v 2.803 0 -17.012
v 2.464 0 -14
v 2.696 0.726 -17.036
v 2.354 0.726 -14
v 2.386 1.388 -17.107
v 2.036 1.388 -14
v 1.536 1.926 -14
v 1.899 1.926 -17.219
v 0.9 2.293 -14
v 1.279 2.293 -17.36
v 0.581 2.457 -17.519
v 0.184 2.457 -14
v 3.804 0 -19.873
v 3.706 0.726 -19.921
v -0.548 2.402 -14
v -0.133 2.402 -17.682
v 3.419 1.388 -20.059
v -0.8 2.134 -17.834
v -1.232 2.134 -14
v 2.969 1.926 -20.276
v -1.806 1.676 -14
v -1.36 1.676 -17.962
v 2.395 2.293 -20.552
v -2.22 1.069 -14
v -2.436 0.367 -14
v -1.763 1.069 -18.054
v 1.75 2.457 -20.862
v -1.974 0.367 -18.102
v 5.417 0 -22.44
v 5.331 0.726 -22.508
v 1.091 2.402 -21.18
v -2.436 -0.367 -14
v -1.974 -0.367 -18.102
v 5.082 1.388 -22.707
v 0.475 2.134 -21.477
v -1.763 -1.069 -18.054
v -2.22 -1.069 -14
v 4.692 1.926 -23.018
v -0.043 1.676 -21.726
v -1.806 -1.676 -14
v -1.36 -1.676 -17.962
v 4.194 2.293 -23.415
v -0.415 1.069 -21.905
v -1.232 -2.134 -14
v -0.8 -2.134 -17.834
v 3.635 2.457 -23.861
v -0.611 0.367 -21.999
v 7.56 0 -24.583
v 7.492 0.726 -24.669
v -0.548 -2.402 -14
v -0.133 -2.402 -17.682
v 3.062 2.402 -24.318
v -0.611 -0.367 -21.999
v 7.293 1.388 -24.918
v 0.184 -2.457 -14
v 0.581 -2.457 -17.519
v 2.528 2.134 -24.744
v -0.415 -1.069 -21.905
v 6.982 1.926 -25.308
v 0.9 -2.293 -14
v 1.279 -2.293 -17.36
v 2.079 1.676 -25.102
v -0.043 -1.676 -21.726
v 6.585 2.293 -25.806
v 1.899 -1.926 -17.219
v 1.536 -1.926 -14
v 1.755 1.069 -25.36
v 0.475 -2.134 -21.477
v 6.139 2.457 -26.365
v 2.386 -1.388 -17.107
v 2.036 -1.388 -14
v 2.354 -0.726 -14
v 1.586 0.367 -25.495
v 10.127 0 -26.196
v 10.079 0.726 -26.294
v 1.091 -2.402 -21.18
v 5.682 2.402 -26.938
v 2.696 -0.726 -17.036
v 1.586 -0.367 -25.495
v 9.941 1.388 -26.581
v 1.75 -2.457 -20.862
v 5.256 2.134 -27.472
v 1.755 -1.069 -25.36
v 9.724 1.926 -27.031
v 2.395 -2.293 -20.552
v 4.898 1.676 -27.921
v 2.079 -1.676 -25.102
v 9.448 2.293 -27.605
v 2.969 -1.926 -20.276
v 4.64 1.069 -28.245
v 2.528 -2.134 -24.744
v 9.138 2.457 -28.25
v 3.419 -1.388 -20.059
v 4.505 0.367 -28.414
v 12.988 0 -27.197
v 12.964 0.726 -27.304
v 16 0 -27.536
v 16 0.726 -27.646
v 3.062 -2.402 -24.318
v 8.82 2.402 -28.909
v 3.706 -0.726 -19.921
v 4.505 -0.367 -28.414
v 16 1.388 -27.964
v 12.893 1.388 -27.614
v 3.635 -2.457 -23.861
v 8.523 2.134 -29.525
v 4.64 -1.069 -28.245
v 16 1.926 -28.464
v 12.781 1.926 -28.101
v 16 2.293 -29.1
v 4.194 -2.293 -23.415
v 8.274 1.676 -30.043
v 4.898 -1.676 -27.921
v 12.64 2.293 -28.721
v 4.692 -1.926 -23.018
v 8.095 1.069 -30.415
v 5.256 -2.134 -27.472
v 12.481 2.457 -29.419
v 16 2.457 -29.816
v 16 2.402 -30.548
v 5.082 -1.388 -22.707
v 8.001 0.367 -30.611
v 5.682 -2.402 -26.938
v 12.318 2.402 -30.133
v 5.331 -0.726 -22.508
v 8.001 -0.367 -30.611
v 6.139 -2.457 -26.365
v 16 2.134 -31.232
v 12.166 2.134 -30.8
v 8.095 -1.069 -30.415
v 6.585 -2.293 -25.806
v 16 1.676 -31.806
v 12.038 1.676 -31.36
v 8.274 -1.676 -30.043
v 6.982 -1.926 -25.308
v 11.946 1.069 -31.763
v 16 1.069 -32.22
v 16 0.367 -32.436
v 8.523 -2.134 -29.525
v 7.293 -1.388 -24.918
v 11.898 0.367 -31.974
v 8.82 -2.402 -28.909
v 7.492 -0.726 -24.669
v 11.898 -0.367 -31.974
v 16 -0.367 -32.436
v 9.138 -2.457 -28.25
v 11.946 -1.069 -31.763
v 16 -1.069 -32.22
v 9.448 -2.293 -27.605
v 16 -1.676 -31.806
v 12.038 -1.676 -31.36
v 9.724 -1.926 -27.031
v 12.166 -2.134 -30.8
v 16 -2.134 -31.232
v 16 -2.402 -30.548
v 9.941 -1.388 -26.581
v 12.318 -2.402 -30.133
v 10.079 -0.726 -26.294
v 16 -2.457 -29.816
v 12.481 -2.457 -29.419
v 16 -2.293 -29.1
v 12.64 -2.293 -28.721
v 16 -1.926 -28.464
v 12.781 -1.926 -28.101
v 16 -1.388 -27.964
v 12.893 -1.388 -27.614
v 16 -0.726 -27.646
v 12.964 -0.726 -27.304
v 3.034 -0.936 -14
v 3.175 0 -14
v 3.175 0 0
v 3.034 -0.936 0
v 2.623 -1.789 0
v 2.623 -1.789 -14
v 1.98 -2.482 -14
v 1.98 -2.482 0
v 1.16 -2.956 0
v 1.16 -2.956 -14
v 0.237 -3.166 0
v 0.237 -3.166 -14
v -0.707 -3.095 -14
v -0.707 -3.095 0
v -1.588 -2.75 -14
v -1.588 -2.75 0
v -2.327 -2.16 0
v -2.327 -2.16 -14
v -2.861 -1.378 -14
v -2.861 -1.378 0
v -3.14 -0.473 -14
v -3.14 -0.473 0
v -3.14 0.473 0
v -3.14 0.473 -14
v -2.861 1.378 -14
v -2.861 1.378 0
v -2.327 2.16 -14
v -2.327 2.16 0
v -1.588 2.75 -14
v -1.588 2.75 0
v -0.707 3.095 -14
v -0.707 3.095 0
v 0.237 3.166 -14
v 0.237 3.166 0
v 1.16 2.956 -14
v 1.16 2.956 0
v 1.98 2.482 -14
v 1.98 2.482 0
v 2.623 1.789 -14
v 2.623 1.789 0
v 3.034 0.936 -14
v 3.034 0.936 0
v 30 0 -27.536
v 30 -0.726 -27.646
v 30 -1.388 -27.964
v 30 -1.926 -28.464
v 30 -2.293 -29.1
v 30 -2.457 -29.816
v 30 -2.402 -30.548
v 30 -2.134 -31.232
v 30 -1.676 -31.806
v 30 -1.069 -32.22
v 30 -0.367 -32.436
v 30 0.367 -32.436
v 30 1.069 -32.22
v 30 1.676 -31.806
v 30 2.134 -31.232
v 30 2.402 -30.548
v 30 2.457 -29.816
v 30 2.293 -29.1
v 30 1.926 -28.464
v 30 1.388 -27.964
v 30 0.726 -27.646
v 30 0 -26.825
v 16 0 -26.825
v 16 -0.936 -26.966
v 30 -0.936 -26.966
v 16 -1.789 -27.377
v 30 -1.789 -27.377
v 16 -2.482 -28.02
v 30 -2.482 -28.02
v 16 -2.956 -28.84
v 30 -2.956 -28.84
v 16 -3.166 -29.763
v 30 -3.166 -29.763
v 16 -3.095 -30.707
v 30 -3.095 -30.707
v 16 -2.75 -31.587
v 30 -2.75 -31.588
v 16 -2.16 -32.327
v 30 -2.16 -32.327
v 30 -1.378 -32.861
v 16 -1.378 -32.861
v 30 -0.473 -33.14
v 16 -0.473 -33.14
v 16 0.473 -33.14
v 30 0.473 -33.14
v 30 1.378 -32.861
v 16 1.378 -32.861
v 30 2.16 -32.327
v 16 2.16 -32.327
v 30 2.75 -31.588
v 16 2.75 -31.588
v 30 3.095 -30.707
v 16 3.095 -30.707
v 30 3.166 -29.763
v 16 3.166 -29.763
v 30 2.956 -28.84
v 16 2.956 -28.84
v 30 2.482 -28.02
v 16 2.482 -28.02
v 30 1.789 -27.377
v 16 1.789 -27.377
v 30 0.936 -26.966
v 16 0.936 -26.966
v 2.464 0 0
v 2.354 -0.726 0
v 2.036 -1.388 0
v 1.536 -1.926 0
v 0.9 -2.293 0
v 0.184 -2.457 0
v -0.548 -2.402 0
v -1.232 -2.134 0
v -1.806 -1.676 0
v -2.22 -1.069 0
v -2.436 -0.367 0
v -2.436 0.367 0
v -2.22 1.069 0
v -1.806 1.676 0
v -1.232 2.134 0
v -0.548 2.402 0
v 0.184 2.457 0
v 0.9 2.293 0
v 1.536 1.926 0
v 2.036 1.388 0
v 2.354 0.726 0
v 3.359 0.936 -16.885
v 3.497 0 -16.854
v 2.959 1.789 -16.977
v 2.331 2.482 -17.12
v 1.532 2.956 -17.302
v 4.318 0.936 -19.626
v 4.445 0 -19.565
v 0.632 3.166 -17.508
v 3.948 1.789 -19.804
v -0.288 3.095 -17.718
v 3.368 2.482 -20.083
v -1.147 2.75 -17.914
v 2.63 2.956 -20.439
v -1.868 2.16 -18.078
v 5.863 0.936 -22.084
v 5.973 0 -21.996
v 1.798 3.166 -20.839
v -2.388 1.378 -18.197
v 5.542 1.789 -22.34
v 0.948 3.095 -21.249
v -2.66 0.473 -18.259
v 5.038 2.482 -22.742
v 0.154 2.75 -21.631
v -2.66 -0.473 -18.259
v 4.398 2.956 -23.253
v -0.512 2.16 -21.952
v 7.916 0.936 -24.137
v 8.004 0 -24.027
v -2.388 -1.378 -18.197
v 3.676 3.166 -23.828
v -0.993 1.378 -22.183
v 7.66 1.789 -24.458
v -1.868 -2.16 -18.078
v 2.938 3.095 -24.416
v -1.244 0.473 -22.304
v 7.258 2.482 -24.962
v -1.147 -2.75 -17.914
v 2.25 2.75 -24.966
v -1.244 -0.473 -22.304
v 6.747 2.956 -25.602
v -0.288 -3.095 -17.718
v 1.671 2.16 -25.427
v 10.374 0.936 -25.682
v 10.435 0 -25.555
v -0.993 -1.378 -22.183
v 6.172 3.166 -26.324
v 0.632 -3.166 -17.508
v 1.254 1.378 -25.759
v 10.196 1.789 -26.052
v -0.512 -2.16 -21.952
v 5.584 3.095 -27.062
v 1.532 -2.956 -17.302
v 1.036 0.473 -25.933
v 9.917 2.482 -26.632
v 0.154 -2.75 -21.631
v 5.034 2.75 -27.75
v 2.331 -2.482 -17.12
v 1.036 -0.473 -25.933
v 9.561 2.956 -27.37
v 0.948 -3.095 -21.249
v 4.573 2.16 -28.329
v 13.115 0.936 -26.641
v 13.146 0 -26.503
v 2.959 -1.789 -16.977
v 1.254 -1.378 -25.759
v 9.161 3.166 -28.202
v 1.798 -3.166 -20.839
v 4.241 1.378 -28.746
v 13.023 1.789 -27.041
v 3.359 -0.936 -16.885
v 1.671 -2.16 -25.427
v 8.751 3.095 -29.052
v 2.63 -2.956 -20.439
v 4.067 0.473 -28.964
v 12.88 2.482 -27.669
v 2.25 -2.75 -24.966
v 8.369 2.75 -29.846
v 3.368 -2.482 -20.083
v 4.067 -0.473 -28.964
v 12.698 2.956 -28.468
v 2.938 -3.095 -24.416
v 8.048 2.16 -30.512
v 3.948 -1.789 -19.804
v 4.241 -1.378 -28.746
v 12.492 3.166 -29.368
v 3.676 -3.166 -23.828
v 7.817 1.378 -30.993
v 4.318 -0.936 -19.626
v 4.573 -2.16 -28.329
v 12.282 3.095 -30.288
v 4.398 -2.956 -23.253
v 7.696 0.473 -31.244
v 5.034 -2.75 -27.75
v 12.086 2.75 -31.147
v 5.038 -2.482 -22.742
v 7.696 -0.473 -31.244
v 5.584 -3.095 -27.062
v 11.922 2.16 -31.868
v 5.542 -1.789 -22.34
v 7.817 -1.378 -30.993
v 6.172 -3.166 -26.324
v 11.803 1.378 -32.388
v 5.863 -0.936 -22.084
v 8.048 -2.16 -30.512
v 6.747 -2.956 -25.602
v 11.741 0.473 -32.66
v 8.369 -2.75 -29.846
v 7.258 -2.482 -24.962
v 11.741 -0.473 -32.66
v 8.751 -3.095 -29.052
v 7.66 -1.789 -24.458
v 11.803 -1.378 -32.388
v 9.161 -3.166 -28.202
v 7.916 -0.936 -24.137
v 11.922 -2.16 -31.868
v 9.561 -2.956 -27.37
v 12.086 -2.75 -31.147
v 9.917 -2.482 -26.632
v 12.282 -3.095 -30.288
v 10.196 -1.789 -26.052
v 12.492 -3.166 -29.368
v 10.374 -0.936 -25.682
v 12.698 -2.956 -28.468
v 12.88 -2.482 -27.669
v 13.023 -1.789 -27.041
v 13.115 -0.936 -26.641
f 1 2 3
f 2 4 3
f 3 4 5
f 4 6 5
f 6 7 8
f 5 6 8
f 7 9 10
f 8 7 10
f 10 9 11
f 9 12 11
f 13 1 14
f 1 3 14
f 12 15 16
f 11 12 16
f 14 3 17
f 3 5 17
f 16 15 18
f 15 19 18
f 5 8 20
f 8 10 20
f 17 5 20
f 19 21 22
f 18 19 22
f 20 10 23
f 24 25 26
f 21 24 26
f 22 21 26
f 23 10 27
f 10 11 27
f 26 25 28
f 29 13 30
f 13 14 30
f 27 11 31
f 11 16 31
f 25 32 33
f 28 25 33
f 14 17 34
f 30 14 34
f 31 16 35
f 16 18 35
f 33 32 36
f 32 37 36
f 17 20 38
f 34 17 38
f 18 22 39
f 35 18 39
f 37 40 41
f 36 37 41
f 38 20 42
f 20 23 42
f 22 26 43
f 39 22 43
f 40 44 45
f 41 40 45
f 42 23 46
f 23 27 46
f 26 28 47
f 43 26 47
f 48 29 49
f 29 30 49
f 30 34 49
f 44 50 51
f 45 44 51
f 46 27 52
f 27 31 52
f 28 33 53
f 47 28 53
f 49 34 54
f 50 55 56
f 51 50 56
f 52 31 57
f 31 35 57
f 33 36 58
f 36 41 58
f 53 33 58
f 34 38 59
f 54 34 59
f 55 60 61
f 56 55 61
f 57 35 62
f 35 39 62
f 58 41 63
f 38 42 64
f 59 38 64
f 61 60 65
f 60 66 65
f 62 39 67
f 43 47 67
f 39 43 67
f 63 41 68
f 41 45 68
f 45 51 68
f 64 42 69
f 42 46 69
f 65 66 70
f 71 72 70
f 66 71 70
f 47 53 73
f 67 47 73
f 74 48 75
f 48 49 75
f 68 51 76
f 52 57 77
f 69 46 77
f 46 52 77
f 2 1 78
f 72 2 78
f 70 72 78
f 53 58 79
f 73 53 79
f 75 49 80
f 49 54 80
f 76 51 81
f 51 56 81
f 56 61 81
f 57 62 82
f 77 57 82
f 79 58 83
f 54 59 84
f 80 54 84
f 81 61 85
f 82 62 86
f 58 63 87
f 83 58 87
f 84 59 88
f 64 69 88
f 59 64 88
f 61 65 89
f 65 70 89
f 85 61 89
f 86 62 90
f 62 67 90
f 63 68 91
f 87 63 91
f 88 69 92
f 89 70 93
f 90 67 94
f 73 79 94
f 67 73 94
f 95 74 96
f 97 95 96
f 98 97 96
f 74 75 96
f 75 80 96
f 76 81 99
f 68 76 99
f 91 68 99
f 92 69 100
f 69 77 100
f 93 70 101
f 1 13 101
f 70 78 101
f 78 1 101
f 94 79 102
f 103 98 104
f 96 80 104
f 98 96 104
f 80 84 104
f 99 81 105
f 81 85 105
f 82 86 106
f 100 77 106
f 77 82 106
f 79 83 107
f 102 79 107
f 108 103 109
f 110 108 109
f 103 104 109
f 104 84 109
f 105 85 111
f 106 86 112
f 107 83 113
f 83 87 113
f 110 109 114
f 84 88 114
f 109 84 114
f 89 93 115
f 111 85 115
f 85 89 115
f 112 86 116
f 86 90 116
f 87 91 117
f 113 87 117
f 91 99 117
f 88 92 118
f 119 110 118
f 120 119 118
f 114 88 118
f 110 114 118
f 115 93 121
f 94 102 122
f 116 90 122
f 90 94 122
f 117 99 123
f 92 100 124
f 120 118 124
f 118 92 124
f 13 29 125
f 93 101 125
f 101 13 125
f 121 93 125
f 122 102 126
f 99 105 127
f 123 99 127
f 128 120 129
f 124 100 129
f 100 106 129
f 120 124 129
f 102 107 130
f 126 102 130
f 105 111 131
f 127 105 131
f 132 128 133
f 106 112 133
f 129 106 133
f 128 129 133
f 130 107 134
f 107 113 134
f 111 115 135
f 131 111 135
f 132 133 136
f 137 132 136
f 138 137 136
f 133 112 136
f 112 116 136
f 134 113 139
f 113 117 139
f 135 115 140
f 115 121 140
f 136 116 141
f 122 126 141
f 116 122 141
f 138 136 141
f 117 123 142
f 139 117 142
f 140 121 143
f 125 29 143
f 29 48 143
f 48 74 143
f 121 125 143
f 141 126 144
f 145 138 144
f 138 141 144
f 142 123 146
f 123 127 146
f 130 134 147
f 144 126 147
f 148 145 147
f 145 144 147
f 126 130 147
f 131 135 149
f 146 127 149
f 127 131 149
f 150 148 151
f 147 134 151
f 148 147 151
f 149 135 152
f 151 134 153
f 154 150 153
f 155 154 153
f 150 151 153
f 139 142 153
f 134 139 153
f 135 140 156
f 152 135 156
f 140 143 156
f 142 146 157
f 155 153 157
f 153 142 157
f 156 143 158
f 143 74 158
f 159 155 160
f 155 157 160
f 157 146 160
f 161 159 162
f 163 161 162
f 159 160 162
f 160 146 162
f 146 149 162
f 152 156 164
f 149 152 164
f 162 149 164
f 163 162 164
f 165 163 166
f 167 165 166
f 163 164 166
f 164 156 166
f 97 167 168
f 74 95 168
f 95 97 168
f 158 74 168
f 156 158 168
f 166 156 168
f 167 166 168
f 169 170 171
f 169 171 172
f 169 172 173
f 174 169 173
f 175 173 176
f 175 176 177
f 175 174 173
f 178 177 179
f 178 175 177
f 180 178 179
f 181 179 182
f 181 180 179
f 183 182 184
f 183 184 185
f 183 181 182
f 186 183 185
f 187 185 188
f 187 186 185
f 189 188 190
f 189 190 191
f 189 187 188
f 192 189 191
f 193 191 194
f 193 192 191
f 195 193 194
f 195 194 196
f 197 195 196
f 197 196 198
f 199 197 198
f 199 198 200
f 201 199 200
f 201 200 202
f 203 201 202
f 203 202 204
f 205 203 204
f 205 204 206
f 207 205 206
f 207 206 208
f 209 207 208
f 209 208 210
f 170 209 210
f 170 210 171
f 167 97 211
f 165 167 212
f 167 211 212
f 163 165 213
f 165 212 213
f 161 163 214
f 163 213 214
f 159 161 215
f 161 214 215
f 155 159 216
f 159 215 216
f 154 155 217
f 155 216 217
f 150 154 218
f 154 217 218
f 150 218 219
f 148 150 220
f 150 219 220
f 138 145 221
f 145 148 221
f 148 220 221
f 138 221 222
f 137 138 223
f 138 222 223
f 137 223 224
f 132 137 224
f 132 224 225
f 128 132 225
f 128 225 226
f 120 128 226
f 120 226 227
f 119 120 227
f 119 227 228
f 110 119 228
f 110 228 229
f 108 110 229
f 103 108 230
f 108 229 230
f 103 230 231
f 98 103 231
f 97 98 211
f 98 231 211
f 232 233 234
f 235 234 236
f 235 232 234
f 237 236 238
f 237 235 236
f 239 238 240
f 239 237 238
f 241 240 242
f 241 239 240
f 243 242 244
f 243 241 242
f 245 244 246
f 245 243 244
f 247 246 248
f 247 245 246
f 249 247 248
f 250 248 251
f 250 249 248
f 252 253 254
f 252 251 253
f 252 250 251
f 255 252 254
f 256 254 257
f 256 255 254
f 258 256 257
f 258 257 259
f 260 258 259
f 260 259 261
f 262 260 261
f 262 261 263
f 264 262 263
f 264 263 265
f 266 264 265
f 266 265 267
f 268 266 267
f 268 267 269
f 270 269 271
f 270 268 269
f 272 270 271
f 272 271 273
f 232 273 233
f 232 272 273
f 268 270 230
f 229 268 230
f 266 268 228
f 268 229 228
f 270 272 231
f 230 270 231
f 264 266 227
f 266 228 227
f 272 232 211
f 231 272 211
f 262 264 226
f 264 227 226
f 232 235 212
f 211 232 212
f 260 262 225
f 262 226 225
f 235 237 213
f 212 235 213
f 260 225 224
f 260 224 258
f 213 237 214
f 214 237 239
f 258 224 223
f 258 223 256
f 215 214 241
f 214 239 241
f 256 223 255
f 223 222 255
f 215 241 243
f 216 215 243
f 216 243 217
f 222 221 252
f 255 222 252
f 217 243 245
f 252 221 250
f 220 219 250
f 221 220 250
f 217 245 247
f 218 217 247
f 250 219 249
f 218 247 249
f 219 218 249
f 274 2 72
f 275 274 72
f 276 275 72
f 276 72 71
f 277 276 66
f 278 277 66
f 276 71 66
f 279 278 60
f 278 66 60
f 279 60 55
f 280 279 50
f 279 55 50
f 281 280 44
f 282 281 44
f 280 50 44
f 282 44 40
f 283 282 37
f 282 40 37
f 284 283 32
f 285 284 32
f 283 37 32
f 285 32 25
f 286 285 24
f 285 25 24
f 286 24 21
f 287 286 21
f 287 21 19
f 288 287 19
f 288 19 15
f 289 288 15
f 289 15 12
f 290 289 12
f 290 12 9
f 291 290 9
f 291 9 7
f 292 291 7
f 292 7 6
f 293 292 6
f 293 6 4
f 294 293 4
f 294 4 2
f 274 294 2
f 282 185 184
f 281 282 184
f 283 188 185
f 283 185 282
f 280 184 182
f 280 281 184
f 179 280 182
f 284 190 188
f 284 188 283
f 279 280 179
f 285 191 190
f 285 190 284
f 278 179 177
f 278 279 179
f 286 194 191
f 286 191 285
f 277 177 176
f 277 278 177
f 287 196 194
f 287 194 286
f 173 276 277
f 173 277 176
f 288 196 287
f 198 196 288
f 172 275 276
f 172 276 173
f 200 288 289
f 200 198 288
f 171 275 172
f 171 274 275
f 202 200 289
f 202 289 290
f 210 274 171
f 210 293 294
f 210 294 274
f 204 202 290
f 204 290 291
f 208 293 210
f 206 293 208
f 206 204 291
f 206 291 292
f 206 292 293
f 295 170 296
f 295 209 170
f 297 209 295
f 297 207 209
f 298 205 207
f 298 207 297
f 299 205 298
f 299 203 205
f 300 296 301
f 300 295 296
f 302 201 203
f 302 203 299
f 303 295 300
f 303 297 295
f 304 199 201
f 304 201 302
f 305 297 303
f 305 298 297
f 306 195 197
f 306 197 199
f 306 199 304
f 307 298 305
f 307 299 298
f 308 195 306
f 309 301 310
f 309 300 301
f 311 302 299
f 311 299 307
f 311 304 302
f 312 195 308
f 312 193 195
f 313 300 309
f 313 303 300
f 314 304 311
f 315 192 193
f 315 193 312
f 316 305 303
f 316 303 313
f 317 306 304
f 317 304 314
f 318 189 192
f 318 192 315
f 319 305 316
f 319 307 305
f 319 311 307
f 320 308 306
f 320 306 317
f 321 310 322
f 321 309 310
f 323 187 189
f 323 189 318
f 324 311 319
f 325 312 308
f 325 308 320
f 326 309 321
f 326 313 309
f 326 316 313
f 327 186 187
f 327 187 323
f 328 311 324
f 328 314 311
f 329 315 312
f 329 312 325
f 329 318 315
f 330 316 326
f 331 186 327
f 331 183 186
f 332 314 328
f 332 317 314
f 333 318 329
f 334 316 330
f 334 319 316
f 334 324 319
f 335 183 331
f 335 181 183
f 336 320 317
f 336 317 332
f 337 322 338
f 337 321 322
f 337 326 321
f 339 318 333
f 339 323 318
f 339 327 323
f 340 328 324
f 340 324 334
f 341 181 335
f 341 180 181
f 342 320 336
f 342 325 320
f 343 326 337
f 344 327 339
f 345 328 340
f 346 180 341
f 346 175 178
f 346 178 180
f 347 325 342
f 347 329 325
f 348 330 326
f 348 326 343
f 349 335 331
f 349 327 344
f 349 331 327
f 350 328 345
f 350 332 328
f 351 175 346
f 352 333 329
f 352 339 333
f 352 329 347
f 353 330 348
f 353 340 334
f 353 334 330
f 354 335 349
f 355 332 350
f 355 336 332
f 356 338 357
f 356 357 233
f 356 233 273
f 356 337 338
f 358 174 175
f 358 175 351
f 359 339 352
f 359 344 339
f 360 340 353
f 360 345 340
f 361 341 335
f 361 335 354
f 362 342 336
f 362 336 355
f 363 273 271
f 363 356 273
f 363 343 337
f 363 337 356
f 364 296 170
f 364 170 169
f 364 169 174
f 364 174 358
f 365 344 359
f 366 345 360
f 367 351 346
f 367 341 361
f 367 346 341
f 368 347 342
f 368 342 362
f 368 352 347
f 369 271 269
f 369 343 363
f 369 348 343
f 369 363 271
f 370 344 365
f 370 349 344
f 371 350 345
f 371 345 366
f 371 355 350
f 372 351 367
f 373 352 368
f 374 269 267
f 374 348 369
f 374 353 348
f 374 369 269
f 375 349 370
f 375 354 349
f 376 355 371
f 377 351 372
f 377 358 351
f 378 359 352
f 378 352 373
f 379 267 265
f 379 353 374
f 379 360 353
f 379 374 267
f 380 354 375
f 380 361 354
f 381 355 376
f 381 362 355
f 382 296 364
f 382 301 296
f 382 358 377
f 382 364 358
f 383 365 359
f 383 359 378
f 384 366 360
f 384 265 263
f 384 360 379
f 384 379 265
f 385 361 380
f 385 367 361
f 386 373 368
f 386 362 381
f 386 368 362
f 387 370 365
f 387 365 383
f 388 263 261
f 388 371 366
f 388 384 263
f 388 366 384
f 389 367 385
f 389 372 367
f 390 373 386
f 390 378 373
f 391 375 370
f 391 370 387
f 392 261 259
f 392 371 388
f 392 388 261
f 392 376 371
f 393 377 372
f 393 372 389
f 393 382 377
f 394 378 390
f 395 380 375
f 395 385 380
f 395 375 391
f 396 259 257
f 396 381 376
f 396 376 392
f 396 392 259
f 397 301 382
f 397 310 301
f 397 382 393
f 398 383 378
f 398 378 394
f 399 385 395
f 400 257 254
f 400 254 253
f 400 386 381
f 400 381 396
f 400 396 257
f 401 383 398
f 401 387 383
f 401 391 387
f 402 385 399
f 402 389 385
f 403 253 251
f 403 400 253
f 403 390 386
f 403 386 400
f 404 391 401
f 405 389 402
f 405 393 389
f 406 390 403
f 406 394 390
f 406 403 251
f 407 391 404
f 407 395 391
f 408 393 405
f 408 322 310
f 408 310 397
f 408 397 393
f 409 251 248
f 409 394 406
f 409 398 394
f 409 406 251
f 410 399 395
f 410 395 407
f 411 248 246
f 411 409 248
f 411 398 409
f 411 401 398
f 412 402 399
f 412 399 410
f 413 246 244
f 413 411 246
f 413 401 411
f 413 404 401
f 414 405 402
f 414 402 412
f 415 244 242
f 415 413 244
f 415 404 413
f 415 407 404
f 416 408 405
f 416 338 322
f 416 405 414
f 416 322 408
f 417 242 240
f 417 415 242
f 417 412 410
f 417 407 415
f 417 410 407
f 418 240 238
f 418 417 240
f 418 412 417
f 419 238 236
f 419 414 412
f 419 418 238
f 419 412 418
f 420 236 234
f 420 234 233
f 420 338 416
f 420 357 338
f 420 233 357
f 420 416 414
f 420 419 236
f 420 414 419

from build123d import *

# Parameters (mm, degrees)
SKETCH2_R   = 3.175
SKETCH2_R_2 = 2.4638


with BuildPart() as part:
    # Sweep-Thin1: sweep along a path in Sketch1
    with BuildLine(Plane(origin=(0, 0, 0), x_dir=(1, 0, 0), z_dir=(0, 1, 0))) as sweep_thin1_path:
        Line((0, 0), (0, 14))
        ThreePointArc((0, 14), (4.686291501, 25.313708499), (16, 30))
        Line((16, 30), (17.2, 30))
        Line((17.2, 30), (30, 30))
    # Sketch2 → Sweep-Thin1 (sweep)
    with BuildSketch(Plane.XY):
        Circle(SKETCH2_R)
        Circle(SKETCH2_R_2, mode=Mode.SUBTRACT)
    sweep(path=sweep_thin1_path.line)


solid = part.part
